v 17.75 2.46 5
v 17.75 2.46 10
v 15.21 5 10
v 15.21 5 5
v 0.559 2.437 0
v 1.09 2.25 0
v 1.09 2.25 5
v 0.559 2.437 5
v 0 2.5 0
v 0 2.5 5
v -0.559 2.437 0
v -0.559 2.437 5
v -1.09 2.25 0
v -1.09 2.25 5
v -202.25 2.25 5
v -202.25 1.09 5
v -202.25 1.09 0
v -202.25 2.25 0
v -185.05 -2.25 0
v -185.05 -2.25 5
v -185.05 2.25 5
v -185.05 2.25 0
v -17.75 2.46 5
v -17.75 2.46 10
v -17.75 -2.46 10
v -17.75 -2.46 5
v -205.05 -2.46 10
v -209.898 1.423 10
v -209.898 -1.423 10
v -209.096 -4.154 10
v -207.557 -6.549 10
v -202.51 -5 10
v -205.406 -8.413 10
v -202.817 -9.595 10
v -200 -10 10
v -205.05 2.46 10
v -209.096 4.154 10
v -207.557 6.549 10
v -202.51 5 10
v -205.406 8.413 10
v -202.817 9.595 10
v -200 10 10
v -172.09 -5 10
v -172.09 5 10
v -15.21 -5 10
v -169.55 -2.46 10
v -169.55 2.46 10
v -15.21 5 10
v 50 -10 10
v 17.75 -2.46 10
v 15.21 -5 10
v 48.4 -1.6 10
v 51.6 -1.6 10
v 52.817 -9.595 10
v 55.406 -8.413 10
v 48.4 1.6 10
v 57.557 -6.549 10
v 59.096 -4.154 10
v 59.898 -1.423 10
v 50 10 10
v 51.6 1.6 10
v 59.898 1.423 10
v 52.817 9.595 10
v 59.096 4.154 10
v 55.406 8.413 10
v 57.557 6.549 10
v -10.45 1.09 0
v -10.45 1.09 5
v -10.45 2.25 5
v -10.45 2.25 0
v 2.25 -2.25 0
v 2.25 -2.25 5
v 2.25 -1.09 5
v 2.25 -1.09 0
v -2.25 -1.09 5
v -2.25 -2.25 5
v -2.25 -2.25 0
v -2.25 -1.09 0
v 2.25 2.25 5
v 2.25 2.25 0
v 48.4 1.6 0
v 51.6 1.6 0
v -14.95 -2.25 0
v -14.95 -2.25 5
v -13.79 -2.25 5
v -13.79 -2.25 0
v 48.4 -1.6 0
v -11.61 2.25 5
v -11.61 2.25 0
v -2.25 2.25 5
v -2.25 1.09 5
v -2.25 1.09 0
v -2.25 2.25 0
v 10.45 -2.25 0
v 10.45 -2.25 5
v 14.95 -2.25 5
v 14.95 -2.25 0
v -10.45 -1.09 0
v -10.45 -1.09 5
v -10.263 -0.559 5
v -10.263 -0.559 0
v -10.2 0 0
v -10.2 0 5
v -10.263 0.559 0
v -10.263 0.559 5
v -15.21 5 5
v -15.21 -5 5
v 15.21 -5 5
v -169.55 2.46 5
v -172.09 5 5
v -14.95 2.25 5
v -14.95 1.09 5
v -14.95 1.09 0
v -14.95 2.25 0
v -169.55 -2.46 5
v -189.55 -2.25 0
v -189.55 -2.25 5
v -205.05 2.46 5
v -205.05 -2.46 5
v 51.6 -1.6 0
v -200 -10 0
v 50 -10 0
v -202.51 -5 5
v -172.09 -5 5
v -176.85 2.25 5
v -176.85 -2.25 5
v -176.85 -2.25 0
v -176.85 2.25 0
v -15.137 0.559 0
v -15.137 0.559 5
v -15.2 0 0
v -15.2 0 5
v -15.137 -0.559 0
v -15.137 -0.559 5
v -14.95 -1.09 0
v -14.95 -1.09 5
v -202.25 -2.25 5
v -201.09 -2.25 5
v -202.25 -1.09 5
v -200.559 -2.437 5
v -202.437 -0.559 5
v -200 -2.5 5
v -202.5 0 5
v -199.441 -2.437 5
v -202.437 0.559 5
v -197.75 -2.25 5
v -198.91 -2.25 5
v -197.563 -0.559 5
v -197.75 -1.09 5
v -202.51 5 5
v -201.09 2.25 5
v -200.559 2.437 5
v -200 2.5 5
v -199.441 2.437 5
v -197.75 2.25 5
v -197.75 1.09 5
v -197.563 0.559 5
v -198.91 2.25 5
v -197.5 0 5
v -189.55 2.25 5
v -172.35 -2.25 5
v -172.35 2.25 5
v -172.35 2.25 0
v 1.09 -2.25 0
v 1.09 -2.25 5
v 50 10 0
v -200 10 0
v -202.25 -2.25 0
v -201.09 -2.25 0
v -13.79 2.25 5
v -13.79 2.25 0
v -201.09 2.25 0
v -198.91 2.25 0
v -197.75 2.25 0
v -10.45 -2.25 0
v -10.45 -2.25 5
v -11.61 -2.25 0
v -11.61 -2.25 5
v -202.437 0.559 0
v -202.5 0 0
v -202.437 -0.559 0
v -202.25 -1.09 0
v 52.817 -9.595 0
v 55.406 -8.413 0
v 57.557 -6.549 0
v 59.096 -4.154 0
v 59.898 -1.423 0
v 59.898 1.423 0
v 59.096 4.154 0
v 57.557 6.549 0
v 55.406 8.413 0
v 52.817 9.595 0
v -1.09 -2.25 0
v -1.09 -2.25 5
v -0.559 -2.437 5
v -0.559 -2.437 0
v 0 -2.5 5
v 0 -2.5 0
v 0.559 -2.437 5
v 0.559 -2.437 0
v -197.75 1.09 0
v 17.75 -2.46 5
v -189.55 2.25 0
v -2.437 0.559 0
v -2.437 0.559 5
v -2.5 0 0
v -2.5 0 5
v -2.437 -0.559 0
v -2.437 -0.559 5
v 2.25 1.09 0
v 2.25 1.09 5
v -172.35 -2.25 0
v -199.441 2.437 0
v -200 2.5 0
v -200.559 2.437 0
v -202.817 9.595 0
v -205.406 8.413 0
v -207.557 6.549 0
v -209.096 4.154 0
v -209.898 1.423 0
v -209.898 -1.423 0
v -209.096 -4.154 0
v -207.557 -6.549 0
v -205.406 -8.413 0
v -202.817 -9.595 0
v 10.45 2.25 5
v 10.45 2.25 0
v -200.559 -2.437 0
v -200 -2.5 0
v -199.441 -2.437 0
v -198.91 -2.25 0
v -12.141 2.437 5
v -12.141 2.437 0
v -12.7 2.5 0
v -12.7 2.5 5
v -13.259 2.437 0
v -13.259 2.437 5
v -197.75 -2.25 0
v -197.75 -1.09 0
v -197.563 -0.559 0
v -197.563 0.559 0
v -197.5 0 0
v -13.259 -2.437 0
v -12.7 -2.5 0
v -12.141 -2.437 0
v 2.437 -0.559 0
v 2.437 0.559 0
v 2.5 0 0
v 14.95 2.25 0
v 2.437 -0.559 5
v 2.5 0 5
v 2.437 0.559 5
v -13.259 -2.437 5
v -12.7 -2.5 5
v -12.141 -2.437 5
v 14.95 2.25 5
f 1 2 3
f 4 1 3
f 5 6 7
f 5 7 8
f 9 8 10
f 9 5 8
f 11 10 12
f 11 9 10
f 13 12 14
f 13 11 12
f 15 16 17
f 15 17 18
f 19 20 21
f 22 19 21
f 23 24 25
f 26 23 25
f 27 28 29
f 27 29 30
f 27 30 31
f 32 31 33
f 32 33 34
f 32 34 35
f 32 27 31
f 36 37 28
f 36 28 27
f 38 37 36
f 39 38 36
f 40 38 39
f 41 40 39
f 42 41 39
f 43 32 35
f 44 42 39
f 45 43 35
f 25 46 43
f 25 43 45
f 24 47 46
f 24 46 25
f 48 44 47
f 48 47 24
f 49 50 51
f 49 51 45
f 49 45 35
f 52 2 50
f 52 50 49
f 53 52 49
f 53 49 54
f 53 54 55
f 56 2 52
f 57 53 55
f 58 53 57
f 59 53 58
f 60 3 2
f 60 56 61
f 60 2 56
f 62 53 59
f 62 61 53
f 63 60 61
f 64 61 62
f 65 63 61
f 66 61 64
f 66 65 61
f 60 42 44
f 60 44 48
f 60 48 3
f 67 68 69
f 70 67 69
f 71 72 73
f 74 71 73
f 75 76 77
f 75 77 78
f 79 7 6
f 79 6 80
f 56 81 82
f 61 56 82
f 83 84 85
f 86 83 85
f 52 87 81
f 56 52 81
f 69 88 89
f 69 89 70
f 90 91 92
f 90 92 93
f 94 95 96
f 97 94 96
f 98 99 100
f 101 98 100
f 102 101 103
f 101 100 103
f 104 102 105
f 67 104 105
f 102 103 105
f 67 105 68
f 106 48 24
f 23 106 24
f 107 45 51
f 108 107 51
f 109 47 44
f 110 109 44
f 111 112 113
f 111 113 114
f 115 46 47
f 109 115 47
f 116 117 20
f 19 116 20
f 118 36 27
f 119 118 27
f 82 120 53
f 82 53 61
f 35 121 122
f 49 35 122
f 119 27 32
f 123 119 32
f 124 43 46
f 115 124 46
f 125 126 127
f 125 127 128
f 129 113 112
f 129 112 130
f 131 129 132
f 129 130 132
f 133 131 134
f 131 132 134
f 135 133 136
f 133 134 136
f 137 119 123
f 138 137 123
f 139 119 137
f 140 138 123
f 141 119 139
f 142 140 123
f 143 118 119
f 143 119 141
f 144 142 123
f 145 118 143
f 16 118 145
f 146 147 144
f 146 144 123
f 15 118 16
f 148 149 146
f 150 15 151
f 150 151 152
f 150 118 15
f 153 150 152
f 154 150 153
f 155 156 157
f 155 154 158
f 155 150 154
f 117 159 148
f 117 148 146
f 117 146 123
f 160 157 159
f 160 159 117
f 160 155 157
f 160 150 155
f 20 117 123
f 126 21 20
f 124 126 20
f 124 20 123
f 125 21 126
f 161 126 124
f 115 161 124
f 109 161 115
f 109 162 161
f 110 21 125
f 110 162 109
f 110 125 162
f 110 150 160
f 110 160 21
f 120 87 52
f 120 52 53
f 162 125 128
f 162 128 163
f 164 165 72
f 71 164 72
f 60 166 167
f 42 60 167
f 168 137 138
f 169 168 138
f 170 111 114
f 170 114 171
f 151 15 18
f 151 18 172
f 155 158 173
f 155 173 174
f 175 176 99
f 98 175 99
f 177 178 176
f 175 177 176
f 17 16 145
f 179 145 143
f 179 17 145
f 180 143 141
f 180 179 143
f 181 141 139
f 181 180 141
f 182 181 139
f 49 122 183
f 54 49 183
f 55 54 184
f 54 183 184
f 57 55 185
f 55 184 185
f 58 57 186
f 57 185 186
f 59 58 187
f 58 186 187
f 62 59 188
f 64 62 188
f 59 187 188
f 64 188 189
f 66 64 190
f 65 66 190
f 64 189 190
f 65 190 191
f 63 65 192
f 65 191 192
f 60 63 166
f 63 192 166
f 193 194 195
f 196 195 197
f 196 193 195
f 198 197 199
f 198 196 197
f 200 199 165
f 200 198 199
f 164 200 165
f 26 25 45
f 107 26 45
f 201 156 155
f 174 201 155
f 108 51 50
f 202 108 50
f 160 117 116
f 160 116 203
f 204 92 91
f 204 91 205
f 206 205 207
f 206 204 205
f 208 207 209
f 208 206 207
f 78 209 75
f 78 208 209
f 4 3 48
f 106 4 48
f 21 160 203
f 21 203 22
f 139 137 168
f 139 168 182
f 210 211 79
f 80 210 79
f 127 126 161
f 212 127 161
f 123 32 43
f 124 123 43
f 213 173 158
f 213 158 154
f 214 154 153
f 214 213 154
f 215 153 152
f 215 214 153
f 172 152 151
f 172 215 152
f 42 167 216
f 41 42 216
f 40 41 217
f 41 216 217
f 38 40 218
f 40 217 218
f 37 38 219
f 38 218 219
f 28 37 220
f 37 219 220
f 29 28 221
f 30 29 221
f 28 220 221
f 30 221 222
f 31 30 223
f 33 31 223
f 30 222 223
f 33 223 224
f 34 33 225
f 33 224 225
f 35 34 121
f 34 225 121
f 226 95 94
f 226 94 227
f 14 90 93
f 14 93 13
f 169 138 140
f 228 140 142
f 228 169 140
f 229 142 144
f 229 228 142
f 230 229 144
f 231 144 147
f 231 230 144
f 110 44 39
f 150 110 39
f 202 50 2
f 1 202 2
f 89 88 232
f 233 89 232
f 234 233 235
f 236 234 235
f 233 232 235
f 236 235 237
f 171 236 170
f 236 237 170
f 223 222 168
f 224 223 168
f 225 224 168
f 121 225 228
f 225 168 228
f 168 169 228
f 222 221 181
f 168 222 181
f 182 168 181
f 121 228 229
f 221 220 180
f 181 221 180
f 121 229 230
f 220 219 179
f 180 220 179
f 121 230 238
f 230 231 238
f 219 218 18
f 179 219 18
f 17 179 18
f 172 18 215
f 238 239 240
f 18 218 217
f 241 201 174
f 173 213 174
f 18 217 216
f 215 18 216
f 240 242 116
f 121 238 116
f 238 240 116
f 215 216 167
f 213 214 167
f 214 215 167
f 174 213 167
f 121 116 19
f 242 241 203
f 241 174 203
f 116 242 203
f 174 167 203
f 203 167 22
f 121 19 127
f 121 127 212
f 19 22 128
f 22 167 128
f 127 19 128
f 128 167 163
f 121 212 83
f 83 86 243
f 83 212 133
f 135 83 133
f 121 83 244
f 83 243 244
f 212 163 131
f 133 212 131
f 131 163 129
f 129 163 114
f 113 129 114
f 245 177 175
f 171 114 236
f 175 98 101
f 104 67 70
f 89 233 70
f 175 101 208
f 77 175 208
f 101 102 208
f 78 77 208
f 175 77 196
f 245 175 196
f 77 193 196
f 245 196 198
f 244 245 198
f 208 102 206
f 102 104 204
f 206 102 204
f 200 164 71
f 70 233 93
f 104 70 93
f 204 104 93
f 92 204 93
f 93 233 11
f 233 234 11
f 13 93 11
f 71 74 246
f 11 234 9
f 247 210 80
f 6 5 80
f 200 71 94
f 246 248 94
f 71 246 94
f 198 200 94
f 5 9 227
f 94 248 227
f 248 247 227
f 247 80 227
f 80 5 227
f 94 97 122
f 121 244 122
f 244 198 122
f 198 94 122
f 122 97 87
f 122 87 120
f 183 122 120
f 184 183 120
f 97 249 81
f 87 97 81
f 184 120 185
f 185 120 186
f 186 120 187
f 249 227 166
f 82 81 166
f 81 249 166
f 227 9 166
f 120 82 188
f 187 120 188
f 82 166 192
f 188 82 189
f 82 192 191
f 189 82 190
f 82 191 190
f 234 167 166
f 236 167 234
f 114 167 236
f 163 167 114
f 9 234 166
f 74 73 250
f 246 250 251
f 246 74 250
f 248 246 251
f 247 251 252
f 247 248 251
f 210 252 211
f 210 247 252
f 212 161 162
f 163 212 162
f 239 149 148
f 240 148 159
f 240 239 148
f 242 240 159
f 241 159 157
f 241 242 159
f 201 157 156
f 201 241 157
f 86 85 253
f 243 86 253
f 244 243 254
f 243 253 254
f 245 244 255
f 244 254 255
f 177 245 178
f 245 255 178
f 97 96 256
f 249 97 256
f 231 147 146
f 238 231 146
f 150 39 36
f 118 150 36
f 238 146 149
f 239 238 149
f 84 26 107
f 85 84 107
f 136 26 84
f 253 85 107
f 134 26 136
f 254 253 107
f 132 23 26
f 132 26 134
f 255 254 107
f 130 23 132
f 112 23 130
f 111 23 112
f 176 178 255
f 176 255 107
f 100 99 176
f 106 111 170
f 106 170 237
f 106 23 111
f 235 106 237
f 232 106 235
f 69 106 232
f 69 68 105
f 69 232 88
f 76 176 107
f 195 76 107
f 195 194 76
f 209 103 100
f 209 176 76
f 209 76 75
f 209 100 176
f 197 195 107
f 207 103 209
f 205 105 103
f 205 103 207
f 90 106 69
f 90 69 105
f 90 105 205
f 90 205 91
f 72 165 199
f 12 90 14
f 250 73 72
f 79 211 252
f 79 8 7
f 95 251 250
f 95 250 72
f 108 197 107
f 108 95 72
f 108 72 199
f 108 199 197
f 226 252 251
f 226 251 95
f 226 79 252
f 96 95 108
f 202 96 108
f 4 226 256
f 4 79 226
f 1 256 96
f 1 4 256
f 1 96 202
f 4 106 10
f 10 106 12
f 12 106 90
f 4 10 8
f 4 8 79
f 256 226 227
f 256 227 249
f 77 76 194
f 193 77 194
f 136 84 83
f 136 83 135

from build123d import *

# Parameters (mm, degrees)
SKETCH1_R           = 2.5
SKETCH1_W           = 3.2
SKETCH1_H           = 3.2
BOSS_EXTRUDE1_DEPTH = 10
SKETCH2_3_W         = 4.5
SKETCH2_3_H         = 4.5
CUT_EXTRUDE2_DEPTH  = 211.475651798
CUT_EXTRUDE1_START  = -5
SKETCH2_W           = 4.5
SKETCH2_H           = 4.5
CUT_EXTRUDE1_DEPTH  = 5


with BuildPart() as part:
    # Sketch1 → Boss-Extrude1 (new body)
    with BuildSketch(Plane.XY):
        with BuildLine():
            Line((50, 10), (-200, 10))
            ThreePointArc((-200, 10), (-210, 0), (-200, -10))
            Line((-200, -10), (50, -10))
            ThreePointArc((50, -10), (60, 0), (50, 10))
        make_face()
        Circle(SKETCH1_R, mode=Mode.SUBTRACT)
        with Locations((-200, 0)):
            Circle(SKETCH1_R, mode=Mode.SUBTRACT)
        with Locations((50, 0)):
            Rectangle(SKETCH1_W, SKETCH1_H, mode=Mode.SUBTRACT)
    extrude(amount=BOSS_EXTRUDE1_DEPTH)

    # Sketch2<3> → Cut-Extrude2 (cut, through all)
    with BuildSketch(Plane.XY.offset(10)):
        with Locations((12.7, 0)):
            Rectangle(SKETCH2_3_W, SKETCH2_3_H)
        Rectangle(SKETCH2_3_W, SKETCH2_3_H)
        with BuildLine():
            Line((-10.45, 1.089724736), (-10.45, 2.25))
            Line((-10.45, 2.25), (-11.610275264, 2.25))
            ThreePointArc((-11.610275264, 2.25), (-12.7, 2.5), (-13.789724736, 2.25))
            Line((-13.789724736, 2.25), (-14.95, 2.25))
            Line((-14.95, 2.25), (-14.95, 1.089724736))
            ThreePointArc((-14.95, 1.089724736), (-15.2, 0), (-14.95, -1.089724736))
            Line((-14.95, -1.089724736), (-14.95, -2.25))
            Line((-14.95, -2.25), (-13.789724736, -2.25))
            ThreePointArc((-13.789724736, -2.25), (-12.7, -2.5), (-11.610275264, -2.25))
            Line((-11.610275264, -2.25), (-10.45, -2.25))
            Line((-10.45, -2.25), (-10.45, -1.089724736))
            ThreePointArc((-10.45, -1.089724736), (-10.2, 0), (-10.45, 1.089724736))
        make_face()
        with Locations((-174.6, 0)):
            Rectangle(SKETCH2_3_W, SKETCH2_3_H)
        with Locations((-187.3, 0)):
            Rectangle(SKETCH2_3_W, SKETCH2_3_H)
        with BuildLine():
            Line((-197.75, 1.089724736), (-197.75, 2.25))
            Line((-197.75, 2.25), (-198.910275264, 2.25))
            ThreePointArc((-198.910275264, 2.25), (-200, 2.5), (-201.089724736, 2.25))
            Line((-201.089724736, 2.25), (-202.25, 2.25))
            Line((-202.25, 2.25), (-202.25, 1.089724736))
            ThreePointArc((-202.25, 1.089724736), (-202.5, 0), (-202.25, -1.089724736))
            Line((-202.25, -1.089724736), (-202.25, -2.25))
            Line((-202.25, -2.25), (-201.089724736, -2.25))
            ThreePointArc((-201.089724736, -2.25), (-200, -2.5), (-198.910275264, -2.25))
            Line((-198.910275264, -2.25), (-197.75, -2.25))
            Line((-197.75, -2.25), (-197.75, -1.089724736))
            ThreePointArc((-197.75, -1.089724736), (-197.5, 0), (-197.75, 1.089724736))
        make_face()
    extrude(amount=-CUT_EXTRUDE2_DEPTH, mode=Mode.SUBTRACT)

    # Sketch2 → Cut-Extrude1 (cut)
    # profile 1 of 2: a face of its own
    with BuildSketch(Plane.XY.offset(10).offset(CUT_EXTRUDE1_START)):
        Polygon((-15.21, -5), (15.21, -5), (17.75, -2.46), (17.75, 2.46), (15.21, 5), (-15.21, 5), (-17.75, 2.46), (-17.75, -2.46), align=None)
        with BuildLine():
            Line((-11.610275264, 2.25), (-10.45, 2.25))
            Line((-10.45, 2.25), (-10.45, 1.089724736))
            ThreePointArc((-10.45, 1.089724736), (-10.2, 0), (-10.45, -1.089724736))
            Line((-10.45, -1.089724736), (-10.45, -2.25))
            Line((-10.45, -2.25), (-11.610275264, -2.25))
            ThreePointArc((-11.610275264, -2.25), (-12.7, -2.5), (-13.789724736, -2.25))
            Line((-13.789724736, -2.25), (-14.95, -2.25))
            Line((-14.95, -2.25), (-14.95, -1.089724736))
            ThreePointArc((-14.95, -1.089724736), (-15.2, 0), (-14.95, 1.089724736))
            Line((-14.95, 1.089724736), (-14.95, 2.25))
            Line((-14.95, 2.25), (-13.789724736, 2.25))
            ThreePointArc((-13.789724736, 2.25), (-12.7, 2.5), (-11.610275264, 2.25))
        make_face(mode=Mode.SUBTRACT)
        with BuildLine():
            Line((1.089724736, 2.25), (2.25, 2.25))
            Line((2.25, 2.25), (2.25, 1.089724736))
            ThreePointArc((2.25, 1.089724736), (2.5, 0), (2.25, -1.089724736))
            Line((2.25, -1.089724736), (2.25, -2.25))
            Line((2.25, -2.25), (1.089724736, -2.25))
            ThreePointArc((1.089724736, -2.25), (0, -2.5), (-1.089724736, -2.25))
            Line((-1.089724736, -2.25), (-2.25, -2.25))
            Line((-2.25, -2.25), (-2.25, -1.089724736))
            ThreePointArc((-2.25, -1.089724736), (-2.5, 0), (-2.25, 1.089724736))
            Line((-2.25, 1.089724736), (-2.25, 2.25))
            Line((-2.25, 2.25), (-1.089724736, 2.25))
            ThreePointArc((-1.089724736, 2.25), (0, 2.5), (1.089724736, 2.25))
        make_face(mode=Mode.SUBTRACT)
        with Locations((12.7, 0)):
            Rectangle(SKETCH2_W, SKETCH2_H, mode=Mode.SUBTRACT)
    # profile 2 of 2: a face of its own
    with BuildSketch(Plane.XY.offset(10).offset(CUT_EXTRUDE1_START)):
        Polygon((-202.51, -5), (-172.09, -5), (-169.55, -2.46), (-169.55, 2.46), (-172.09, 5), (-202.51, 5), (-205.05, 2.46), (-205.05, -2.46), align=None)
        with BuildLine():
            Line((-198.910275264, 2.25), (-197.75, 2.25))
            Line((-197.75, 2.25), (-197.75, 1.089724736))
            ThreePointArc((-197.75, 1.089724736), (-197.5, 0), (-197.75, -1.089724736))
            Line((-197.75, -1.089724736), (-197.75, -2.25))
            Line((-197.75, -2.25), (-198.910275264, -2.25))
            ThreePointArc((-198.910275264, -2.25), (-200, -2.5), (-201.089724736, -2.25))
            Line((-201.089724736, -2.25), (-202.25, -2.25))
            Line((-202.25, -2.25), (-202.25, -1.089724736))
            ThreePointArc((-202.25, -1.089724736), (-202.5, 0), (-202.25, 1.089724736))
            Line((-202.25, 1.089724736), (-202.25, 2.25))
            Line((-202.25, 2.25), (-201.089724736, 2.25))
            ThreePointArc((-201.089724736, 2.25), (-200, 2.5), (-198.910275264, 2.25))
        make_face(mode=Mode.SUBTRACT)
        with Locations((-187.3, 0)):
            Rectangle(SKETCH2_W, SKETCH2_H, mode=Mode.SUBTRACT)
        with Locations((-174.6, 0)):
            Rectangle(SKETCH2_W, SKETCH2_H, mode=Mode.SUBTRACT)
    extrude(amount=CUT_EXTRUDE1_DEPTH, mode=Mode.SUBTRACT)


solid = part.part
